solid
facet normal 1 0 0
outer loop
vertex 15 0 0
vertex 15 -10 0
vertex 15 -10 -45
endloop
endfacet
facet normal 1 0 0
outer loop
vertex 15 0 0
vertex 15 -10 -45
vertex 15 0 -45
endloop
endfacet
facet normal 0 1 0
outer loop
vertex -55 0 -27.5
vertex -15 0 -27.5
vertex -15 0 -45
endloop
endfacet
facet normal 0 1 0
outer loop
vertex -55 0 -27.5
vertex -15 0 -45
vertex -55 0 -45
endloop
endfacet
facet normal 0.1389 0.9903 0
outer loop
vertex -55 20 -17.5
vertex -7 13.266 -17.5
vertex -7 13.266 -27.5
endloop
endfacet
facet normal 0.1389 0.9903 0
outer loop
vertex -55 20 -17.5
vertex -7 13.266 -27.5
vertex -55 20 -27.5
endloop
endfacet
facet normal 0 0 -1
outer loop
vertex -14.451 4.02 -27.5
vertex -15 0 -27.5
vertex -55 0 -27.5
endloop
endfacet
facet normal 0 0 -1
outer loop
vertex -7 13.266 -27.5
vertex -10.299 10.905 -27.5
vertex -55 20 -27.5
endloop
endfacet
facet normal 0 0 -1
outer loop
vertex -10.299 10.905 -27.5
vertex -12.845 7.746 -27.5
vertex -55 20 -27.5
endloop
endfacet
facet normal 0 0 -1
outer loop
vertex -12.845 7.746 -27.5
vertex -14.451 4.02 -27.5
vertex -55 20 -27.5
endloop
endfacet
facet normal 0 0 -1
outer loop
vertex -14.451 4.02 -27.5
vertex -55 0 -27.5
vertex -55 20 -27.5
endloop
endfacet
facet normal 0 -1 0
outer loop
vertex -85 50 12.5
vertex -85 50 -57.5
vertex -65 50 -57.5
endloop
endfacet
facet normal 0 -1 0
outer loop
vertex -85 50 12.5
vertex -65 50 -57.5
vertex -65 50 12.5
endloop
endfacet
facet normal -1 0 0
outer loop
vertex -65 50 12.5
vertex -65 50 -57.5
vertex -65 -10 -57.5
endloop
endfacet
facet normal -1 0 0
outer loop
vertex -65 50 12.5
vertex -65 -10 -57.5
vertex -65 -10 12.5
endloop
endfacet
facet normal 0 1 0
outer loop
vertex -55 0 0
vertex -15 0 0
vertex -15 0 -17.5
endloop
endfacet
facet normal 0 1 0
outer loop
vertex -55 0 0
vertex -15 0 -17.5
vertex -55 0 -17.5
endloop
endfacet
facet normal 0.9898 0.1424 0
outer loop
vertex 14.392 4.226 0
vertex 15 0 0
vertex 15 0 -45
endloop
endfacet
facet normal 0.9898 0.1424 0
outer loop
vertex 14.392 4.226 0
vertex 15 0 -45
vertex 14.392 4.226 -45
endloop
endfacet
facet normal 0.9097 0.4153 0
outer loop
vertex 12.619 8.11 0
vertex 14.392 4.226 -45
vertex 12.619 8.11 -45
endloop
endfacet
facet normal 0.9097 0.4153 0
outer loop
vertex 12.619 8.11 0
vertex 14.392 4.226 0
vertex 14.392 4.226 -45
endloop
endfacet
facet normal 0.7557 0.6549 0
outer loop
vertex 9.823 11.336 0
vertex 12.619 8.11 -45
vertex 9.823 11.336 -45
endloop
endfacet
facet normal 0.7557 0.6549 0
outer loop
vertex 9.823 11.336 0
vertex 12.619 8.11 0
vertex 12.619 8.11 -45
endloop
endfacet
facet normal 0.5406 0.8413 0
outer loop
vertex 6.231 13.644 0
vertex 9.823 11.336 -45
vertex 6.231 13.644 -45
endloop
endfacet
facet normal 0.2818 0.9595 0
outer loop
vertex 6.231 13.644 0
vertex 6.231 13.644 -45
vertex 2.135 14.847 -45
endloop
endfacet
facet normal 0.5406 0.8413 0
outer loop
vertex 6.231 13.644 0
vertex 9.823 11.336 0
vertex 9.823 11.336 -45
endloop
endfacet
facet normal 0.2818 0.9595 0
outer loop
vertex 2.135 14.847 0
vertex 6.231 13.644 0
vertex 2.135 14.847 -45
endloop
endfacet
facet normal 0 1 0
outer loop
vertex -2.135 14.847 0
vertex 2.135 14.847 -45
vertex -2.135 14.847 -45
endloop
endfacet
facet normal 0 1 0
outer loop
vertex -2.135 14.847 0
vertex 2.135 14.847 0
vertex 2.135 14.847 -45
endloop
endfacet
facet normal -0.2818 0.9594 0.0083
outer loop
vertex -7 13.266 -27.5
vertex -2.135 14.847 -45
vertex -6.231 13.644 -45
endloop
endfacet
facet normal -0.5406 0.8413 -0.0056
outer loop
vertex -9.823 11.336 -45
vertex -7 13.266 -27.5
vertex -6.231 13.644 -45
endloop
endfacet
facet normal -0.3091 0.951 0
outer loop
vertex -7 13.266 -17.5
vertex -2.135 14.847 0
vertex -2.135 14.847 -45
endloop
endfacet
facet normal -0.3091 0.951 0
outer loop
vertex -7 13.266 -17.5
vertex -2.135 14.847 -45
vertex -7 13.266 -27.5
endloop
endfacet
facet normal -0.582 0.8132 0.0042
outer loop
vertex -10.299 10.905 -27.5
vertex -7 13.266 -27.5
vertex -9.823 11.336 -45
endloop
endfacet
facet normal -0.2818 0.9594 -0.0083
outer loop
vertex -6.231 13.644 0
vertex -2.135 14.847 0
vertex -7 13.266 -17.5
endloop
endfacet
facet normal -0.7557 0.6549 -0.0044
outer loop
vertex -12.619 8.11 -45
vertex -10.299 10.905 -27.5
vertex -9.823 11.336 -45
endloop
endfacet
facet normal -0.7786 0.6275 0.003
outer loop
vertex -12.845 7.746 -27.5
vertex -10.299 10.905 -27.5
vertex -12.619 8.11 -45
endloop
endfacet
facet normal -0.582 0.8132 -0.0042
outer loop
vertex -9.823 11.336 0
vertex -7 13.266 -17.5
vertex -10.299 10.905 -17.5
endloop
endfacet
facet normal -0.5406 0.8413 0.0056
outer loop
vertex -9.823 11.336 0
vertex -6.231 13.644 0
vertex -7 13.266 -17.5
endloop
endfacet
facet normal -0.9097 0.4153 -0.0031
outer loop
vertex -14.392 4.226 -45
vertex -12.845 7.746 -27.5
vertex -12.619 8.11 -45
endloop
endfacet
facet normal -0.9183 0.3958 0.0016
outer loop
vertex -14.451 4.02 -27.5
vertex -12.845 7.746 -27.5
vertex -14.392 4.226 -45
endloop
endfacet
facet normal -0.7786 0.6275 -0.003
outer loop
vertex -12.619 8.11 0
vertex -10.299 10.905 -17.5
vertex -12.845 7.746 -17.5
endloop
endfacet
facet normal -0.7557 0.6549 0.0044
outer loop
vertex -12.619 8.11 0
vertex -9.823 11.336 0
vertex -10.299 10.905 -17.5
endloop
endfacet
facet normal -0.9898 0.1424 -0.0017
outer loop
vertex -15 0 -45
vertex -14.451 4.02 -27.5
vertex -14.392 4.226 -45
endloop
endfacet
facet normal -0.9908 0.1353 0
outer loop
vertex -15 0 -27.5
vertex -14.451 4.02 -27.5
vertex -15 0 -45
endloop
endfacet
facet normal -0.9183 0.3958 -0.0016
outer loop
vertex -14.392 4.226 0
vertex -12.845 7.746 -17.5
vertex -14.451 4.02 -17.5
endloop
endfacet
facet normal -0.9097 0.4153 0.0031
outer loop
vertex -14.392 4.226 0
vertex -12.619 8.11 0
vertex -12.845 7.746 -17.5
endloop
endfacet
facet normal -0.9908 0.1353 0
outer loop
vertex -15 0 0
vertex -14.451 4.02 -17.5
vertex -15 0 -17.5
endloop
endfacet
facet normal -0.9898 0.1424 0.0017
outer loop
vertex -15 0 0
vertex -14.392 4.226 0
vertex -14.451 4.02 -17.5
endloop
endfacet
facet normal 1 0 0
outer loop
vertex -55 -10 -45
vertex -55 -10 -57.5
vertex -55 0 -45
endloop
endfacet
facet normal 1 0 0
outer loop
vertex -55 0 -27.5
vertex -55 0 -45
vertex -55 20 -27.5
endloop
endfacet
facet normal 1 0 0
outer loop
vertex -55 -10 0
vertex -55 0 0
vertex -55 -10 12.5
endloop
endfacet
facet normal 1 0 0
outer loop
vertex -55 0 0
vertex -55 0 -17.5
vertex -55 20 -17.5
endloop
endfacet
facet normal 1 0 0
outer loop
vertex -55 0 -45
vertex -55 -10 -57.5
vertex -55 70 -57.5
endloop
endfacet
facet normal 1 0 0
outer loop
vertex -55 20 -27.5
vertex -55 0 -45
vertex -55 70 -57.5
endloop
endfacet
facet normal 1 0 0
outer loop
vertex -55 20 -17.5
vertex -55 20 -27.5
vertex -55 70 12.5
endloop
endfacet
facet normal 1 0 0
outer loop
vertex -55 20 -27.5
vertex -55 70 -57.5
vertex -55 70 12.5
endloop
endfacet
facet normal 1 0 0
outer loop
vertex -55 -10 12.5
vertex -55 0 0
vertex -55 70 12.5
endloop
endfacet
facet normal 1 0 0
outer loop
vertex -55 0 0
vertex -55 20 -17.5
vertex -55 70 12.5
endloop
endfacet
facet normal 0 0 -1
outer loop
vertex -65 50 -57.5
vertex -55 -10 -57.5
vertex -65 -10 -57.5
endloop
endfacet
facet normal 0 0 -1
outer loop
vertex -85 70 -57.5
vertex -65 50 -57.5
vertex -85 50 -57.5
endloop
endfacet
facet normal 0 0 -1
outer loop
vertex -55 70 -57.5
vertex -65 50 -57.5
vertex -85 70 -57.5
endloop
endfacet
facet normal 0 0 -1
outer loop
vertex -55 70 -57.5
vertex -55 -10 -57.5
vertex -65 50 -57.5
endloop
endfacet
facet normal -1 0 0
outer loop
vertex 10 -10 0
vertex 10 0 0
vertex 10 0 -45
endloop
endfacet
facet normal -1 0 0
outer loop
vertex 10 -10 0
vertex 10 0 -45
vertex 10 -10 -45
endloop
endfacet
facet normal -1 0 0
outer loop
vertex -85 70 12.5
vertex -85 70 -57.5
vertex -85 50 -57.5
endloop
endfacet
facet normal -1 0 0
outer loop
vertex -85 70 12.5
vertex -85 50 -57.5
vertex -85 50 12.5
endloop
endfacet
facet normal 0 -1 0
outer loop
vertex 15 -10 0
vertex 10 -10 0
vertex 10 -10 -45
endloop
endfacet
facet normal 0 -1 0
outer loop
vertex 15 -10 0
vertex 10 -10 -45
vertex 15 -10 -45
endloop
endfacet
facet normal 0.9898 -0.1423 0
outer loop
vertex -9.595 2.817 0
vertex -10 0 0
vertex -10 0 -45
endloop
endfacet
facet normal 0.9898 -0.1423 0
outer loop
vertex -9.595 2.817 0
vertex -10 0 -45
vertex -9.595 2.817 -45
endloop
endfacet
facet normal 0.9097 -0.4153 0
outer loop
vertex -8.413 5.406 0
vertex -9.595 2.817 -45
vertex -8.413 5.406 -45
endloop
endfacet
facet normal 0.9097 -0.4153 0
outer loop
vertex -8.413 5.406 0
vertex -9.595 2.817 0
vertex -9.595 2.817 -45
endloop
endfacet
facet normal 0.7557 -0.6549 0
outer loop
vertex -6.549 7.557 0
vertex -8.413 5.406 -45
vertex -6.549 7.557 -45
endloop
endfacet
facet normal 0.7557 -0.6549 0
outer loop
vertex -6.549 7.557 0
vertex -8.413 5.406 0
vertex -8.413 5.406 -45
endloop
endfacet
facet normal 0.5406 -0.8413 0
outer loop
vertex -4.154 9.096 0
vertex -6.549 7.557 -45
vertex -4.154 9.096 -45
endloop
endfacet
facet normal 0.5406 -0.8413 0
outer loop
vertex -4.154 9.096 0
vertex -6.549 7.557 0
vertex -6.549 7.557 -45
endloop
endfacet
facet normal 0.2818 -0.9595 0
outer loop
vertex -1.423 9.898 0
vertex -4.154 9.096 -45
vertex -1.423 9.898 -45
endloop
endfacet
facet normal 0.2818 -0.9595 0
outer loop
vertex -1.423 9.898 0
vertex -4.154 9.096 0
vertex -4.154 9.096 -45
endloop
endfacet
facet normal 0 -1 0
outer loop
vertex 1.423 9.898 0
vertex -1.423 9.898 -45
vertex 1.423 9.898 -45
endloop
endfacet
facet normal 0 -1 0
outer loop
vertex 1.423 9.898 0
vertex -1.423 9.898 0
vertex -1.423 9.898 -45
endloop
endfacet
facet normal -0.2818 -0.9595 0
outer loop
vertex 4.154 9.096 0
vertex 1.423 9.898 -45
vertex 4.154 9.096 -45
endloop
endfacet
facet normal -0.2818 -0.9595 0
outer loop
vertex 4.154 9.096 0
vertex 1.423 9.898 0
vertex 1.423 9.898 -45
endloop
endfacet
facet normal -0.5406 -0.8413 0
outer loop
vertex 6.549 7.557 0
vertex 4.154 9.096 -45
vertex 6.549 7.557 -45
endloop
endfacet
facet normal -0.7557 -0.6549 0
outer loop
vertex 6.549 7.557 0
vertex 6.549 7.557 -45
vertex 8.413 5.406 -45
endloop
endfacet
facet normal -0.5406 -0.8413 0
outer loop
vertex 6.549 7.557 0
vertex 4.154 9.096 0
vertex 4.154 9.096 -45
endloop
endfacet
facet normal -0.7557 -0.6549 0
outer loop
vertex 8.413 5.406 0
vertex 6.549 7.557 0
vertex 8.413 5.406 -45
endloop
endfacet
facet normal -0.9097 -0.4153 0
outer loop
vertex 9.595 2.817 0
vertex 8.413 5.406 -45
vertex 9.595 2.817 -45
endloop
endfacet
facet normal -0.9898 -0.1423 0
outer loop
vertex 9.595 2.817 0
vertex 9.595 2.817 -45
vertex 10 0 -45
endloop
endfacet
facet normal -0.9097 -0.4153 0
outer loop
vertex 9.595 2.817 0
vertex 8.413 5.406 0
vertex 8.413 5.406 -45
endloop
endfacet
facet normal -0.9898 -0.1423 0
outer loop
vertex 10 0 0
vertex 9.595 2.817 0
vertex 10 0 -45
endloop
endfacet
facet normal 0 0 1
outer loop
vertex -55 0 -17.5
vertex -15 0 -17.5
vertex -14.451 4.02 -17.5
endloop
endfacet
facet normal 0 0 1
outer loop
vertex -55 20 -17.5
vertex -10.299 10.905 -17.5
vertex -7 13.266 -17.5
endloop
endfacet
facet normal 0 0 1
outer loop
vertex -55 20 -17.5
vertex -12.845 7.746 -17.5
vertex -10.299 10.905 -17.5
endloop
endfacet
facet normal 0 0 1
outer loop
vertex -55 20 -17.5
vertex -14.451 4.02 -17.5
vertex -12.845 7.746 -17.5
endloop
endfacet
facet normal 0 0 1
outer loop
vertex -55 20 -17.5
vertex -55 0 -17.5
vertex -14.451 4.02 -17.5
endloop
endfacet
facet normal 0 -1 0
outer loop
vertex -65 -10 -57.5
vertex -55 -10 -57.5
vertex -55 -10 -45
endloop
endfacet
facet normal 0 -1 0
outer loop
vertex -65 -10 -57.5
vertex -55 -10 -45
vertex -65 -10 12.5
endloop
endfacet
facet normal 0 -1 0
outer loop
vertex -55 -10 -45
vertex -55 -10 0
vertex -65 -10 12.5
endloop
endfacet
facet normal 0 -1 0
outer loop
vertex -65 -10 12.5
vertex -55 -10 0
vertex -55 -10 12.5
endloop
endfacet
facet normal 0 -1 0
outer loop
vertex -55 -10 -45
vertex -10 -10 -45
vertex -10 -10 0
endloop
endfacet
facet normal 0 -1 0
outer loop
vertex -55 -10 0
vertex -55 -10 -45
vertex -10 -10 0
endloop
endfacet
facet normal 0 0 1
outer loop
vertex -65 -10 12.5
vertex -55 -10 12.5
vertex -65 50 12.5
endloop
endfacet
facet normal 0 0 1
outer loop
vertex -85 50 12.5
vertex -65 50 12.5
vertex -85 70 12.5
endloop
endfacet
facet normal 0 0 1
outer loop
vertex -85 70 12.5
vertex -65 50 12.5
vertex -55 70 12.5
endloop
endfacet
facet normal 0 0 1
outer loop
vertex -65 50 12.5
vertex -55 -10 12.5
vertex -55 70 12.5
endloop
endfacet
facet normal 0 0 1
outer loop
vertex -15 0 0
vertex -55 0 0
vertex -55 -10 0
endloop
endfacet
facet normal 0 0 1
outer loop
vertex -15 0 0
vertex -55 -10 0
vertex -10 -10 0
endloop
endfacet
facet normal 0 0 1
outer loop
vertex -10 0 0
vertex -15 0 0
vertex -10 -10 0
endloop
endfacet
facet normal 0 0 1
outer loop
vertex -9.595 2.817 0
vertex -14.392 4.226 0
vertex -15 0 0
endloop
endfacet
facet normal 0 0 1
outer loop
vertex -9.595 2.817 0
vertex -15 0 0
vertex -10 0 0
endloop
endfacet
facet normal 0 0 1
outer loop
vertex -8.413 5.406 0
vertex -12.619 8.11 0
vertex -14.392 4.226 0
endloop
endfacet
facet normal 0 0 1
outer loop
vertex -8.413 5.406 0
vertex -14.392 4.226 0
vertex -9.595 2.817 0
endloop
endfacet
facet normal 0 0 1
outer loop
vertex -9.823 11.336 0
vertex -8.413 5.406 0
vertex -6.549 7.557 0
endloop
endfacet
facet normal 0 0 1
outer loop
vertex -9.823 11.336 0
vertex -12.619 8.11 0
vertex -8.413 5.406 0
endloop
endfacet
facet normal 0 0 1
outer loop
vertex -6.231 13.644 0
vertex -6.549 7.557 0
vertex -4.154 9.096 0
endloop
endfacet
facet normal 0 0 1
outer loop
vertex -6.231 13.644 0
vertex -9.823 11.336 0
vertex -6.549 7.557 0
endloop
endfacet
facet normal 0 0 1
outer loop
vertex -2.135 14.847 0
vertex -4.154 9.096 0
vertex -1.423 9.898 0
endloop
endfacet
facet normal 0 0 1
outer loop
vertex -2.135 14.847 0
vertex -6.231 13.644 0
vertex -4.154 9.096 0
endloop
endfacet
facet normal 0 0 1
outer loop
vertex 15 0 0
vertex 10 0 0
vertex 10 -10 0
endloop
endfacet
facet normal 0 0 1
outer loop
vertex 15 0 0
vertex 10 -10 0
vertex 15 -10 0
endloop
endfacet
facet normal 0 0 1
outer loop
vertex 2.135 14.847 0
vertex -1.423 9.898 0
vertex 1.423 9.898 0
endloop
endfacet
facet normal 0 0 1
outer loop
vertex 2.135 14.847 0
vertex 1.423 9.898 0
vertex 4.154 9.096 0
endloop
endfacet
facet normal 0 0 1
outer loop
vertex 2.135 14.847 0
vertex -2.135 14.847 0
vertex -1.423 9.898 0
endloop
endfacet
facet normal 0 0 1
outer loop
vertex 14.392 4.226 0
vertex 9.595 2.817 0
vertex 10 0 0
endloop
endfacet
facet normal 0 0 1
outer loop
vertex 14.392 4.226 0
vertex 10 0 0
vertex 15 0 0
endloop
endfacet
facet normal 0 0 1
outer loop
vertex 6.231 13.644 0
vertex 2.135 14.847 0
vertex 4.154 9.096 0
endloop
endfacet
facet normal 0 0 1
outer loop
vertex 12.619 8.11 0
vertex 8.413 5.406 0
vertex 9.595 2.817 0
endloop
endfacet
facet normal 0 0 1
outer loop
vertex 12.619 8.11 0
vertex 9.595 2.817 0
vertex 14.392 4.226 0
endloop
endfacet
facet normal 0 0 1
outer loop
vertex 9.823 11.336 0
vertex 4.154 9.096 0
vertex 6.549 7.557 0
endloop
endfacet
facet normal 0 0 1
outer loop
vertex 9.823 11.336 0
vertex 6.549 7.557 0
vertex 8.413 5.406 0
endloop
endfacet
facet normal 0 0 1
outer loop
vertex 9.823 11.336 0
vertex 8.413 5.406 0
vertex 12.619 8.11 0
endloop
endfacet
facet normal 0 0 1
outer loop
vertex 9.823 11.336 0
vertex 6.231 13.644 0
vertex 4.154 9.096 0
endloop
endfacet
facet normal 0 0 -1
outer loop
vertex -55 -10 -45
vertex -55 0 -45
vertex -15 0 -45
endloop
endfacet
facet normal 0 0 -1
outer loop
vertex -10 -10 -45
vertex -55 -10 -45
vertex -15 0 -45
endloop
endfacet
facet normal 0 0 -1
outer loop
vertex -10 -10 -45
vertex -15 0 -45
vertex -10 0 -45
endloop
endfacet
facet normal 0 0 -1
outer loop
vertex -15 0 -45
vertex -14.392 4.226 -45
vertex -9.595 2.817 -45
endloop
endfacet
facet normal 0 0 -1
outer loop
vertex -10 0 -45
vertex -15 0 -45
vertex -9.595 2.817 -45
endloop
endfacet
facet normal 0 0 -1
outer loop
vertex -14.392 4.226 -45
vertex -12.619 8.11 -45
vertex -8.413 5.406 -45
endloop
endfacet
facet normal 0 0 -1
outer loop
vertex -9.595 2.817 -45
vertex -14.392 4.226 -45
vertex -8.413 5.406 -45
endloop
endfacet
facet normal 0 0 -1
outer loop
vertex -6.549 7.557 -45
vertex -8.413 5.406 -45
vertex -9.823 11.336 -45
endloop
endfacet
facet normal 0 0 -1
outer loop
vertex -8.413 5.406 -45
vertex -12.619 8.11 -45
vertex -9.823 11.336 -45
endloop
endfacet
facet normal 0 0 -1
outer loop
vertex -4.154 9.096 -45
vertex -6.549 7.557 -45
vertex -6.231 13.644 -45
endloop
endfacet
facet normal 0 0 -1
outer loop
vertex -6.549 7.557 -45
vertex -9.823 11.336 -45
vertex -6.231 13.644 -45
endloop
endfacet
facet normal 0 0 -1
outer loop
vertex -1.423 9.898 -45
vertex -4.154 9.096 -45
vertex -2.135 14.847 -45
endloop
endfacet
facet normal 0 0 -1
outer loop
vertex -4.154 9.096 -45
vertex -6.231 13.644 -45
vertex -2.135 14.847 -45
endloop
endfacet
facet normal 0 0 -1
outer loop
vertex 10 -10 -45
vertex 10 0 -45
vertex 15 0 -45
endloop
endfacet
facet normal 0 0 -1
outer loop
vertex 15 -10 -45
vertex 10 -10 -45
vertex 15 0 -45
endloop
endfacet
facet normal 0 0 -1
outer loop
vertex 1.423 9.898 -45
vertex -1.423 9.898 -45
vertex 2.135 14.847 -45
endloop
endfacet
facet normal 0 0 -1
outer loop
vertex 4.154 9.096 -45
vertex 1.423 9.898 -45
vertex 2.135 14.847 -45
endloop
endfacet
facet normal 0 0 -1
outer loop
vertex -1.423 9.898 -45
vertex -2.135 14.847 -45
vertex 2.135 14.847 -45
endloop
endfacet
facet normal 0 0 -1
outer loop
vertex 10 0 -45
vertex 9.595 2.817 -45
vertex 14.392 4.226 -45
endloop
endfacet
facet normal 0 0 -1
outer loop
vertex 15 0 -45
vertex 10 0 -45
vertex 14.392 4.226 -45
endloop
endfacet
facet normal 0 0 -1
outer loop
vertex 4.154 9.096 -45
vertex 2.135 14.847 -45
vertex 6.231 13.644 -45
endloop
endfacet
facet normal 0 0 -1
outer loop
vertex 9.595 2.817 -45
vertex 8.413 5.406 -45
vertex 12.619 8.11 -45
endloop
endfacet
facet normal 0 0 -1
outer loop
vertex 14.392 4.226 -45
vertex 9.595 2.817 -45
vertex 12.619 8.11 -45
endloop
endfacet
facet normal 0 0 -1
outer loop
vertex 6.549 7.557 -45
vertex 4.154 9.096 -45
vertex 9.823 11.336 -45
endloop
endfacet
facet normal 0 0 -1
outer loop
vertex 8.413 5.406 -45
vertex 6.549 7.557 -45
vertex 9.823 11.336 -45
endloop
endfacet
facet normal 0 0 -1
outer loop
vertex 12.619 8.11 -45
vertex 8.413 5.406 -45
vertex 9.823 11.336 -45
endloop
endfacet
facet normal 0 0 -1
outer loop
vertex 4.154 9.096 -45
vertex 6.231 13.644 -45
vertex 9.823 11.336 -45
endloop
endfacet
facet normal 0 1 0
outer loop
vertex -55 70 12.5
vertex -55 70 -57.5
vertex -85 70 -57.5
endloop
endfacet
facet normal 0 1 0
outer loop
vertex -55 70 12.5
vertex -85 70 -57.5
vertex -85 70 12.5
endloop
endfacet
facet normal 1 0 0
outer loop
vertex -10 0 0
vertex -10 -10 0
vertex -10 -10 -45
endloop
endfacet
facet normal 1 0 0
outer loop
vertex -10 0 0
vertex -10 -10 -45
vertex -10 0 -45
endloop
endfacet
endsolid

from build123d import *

# Parameters (mm, degrees)
EXTRUDE_1_DEPTH     = 45
SKETCH_2_W          = 70
SKETCH_2_H          = 80
EXTRUDE_2_DEPTH     = 30
SKETCH_3_W          = 70
SKETCH_3_H          = 60
CUT_EXTRUDE_1_DEPTH = 20
SKETCH_4_W          = 10
SKETCH_4_H          = 20
EXTRUDE_4_DEPTH     = 48
CUT_EXTRUDE_2_DEPTH = 125.222582488
CUT_EXTRUDE_3_DEPTH = 118.153745139


with BuildPart() as part:
    # 草圖1 → 填料-伸長1 (new body)
    with BuildSketch(Plane.XY):
        with BuildLine():
            Line((-15, 0), (-55, 0))
            Line((-55, 0), (-55, -10))
            Line((-55, -10), (-10, -10))
            Line((-10, -10), (-10, 0))
            ThreePointArc((-10, 0), (0, 10), (10, 0))
            Line((10, 0), (10, -10))
            Line((10, -10), (15, -10))
            Line((15, -10), (15, 0))
            ThreePointArc((15, 0), (0, 15), (-15, 0))
        make_face()
    extrude(amount=-EXTRUDE_1_DEPTH)

    # 草圖2 → 填料-伸長2 (add)
    with BuildSketch(Plane.ZY.offset(55)):
        with Locations((-22.5, 30)):
            Rectangle(SKETCH_2_W, SKETCH_2_H)
    extrude(amount=EXTRUDE_2_DEPTH)

    # 草圖3 → 除料-伸長1 (cut)
    with BuildSketch(Plane.ZY.offset(85)):
        with Locations((-22.5, 20)):
            Rectangle(SKETCH_3_W, SKETCH_3_H)
    extrude(amount=-CUT_EXTRUDE_1_DEPTH, mode=Mode.SUBTRACT)

    # 草圖4 → 填料-伸長4 (add)
    with BuildSketch(Plane(origin=(-55, 0, 0), x_dir=(0, 0, -1), z_dir=(1, 0, 0))):
        with Locations((22.5, 10)):
            Rectangle(SKETCH_4_W, SKETCH_4_H)
    extrude(amount=EXTRUDE_4_DEPTH)

    # 草圖6 → 除料-伸長2 (cut, through all)
    with BuildSketch(Plane.XY):
        with BuildLine():
            Line((10, 0), (10, -10))
            Line((10, -10), (-10, -10))
            Line((-10, -10), (-10, 0))
            ThreePointArc((-10, 0), (0, 10), (10, 0))
        make_face()
    extrude(amount=-CUT_EXTRUDE_2_DEPTH, mode=Mode.SUBTRACT)

    # 草圖7 → 除料-伸長3 (cut, through all)
    with BuildSketch(Plane.XY.offset(-17.5)):
        Polygon((-7, 13.266499161), (-55, 20), (-7, 20), align=None)
    extrude(amount=-CUT_EXTRUDE_3_DEPTH, mode=Mode.SUBTRACT)


solid = part.part
